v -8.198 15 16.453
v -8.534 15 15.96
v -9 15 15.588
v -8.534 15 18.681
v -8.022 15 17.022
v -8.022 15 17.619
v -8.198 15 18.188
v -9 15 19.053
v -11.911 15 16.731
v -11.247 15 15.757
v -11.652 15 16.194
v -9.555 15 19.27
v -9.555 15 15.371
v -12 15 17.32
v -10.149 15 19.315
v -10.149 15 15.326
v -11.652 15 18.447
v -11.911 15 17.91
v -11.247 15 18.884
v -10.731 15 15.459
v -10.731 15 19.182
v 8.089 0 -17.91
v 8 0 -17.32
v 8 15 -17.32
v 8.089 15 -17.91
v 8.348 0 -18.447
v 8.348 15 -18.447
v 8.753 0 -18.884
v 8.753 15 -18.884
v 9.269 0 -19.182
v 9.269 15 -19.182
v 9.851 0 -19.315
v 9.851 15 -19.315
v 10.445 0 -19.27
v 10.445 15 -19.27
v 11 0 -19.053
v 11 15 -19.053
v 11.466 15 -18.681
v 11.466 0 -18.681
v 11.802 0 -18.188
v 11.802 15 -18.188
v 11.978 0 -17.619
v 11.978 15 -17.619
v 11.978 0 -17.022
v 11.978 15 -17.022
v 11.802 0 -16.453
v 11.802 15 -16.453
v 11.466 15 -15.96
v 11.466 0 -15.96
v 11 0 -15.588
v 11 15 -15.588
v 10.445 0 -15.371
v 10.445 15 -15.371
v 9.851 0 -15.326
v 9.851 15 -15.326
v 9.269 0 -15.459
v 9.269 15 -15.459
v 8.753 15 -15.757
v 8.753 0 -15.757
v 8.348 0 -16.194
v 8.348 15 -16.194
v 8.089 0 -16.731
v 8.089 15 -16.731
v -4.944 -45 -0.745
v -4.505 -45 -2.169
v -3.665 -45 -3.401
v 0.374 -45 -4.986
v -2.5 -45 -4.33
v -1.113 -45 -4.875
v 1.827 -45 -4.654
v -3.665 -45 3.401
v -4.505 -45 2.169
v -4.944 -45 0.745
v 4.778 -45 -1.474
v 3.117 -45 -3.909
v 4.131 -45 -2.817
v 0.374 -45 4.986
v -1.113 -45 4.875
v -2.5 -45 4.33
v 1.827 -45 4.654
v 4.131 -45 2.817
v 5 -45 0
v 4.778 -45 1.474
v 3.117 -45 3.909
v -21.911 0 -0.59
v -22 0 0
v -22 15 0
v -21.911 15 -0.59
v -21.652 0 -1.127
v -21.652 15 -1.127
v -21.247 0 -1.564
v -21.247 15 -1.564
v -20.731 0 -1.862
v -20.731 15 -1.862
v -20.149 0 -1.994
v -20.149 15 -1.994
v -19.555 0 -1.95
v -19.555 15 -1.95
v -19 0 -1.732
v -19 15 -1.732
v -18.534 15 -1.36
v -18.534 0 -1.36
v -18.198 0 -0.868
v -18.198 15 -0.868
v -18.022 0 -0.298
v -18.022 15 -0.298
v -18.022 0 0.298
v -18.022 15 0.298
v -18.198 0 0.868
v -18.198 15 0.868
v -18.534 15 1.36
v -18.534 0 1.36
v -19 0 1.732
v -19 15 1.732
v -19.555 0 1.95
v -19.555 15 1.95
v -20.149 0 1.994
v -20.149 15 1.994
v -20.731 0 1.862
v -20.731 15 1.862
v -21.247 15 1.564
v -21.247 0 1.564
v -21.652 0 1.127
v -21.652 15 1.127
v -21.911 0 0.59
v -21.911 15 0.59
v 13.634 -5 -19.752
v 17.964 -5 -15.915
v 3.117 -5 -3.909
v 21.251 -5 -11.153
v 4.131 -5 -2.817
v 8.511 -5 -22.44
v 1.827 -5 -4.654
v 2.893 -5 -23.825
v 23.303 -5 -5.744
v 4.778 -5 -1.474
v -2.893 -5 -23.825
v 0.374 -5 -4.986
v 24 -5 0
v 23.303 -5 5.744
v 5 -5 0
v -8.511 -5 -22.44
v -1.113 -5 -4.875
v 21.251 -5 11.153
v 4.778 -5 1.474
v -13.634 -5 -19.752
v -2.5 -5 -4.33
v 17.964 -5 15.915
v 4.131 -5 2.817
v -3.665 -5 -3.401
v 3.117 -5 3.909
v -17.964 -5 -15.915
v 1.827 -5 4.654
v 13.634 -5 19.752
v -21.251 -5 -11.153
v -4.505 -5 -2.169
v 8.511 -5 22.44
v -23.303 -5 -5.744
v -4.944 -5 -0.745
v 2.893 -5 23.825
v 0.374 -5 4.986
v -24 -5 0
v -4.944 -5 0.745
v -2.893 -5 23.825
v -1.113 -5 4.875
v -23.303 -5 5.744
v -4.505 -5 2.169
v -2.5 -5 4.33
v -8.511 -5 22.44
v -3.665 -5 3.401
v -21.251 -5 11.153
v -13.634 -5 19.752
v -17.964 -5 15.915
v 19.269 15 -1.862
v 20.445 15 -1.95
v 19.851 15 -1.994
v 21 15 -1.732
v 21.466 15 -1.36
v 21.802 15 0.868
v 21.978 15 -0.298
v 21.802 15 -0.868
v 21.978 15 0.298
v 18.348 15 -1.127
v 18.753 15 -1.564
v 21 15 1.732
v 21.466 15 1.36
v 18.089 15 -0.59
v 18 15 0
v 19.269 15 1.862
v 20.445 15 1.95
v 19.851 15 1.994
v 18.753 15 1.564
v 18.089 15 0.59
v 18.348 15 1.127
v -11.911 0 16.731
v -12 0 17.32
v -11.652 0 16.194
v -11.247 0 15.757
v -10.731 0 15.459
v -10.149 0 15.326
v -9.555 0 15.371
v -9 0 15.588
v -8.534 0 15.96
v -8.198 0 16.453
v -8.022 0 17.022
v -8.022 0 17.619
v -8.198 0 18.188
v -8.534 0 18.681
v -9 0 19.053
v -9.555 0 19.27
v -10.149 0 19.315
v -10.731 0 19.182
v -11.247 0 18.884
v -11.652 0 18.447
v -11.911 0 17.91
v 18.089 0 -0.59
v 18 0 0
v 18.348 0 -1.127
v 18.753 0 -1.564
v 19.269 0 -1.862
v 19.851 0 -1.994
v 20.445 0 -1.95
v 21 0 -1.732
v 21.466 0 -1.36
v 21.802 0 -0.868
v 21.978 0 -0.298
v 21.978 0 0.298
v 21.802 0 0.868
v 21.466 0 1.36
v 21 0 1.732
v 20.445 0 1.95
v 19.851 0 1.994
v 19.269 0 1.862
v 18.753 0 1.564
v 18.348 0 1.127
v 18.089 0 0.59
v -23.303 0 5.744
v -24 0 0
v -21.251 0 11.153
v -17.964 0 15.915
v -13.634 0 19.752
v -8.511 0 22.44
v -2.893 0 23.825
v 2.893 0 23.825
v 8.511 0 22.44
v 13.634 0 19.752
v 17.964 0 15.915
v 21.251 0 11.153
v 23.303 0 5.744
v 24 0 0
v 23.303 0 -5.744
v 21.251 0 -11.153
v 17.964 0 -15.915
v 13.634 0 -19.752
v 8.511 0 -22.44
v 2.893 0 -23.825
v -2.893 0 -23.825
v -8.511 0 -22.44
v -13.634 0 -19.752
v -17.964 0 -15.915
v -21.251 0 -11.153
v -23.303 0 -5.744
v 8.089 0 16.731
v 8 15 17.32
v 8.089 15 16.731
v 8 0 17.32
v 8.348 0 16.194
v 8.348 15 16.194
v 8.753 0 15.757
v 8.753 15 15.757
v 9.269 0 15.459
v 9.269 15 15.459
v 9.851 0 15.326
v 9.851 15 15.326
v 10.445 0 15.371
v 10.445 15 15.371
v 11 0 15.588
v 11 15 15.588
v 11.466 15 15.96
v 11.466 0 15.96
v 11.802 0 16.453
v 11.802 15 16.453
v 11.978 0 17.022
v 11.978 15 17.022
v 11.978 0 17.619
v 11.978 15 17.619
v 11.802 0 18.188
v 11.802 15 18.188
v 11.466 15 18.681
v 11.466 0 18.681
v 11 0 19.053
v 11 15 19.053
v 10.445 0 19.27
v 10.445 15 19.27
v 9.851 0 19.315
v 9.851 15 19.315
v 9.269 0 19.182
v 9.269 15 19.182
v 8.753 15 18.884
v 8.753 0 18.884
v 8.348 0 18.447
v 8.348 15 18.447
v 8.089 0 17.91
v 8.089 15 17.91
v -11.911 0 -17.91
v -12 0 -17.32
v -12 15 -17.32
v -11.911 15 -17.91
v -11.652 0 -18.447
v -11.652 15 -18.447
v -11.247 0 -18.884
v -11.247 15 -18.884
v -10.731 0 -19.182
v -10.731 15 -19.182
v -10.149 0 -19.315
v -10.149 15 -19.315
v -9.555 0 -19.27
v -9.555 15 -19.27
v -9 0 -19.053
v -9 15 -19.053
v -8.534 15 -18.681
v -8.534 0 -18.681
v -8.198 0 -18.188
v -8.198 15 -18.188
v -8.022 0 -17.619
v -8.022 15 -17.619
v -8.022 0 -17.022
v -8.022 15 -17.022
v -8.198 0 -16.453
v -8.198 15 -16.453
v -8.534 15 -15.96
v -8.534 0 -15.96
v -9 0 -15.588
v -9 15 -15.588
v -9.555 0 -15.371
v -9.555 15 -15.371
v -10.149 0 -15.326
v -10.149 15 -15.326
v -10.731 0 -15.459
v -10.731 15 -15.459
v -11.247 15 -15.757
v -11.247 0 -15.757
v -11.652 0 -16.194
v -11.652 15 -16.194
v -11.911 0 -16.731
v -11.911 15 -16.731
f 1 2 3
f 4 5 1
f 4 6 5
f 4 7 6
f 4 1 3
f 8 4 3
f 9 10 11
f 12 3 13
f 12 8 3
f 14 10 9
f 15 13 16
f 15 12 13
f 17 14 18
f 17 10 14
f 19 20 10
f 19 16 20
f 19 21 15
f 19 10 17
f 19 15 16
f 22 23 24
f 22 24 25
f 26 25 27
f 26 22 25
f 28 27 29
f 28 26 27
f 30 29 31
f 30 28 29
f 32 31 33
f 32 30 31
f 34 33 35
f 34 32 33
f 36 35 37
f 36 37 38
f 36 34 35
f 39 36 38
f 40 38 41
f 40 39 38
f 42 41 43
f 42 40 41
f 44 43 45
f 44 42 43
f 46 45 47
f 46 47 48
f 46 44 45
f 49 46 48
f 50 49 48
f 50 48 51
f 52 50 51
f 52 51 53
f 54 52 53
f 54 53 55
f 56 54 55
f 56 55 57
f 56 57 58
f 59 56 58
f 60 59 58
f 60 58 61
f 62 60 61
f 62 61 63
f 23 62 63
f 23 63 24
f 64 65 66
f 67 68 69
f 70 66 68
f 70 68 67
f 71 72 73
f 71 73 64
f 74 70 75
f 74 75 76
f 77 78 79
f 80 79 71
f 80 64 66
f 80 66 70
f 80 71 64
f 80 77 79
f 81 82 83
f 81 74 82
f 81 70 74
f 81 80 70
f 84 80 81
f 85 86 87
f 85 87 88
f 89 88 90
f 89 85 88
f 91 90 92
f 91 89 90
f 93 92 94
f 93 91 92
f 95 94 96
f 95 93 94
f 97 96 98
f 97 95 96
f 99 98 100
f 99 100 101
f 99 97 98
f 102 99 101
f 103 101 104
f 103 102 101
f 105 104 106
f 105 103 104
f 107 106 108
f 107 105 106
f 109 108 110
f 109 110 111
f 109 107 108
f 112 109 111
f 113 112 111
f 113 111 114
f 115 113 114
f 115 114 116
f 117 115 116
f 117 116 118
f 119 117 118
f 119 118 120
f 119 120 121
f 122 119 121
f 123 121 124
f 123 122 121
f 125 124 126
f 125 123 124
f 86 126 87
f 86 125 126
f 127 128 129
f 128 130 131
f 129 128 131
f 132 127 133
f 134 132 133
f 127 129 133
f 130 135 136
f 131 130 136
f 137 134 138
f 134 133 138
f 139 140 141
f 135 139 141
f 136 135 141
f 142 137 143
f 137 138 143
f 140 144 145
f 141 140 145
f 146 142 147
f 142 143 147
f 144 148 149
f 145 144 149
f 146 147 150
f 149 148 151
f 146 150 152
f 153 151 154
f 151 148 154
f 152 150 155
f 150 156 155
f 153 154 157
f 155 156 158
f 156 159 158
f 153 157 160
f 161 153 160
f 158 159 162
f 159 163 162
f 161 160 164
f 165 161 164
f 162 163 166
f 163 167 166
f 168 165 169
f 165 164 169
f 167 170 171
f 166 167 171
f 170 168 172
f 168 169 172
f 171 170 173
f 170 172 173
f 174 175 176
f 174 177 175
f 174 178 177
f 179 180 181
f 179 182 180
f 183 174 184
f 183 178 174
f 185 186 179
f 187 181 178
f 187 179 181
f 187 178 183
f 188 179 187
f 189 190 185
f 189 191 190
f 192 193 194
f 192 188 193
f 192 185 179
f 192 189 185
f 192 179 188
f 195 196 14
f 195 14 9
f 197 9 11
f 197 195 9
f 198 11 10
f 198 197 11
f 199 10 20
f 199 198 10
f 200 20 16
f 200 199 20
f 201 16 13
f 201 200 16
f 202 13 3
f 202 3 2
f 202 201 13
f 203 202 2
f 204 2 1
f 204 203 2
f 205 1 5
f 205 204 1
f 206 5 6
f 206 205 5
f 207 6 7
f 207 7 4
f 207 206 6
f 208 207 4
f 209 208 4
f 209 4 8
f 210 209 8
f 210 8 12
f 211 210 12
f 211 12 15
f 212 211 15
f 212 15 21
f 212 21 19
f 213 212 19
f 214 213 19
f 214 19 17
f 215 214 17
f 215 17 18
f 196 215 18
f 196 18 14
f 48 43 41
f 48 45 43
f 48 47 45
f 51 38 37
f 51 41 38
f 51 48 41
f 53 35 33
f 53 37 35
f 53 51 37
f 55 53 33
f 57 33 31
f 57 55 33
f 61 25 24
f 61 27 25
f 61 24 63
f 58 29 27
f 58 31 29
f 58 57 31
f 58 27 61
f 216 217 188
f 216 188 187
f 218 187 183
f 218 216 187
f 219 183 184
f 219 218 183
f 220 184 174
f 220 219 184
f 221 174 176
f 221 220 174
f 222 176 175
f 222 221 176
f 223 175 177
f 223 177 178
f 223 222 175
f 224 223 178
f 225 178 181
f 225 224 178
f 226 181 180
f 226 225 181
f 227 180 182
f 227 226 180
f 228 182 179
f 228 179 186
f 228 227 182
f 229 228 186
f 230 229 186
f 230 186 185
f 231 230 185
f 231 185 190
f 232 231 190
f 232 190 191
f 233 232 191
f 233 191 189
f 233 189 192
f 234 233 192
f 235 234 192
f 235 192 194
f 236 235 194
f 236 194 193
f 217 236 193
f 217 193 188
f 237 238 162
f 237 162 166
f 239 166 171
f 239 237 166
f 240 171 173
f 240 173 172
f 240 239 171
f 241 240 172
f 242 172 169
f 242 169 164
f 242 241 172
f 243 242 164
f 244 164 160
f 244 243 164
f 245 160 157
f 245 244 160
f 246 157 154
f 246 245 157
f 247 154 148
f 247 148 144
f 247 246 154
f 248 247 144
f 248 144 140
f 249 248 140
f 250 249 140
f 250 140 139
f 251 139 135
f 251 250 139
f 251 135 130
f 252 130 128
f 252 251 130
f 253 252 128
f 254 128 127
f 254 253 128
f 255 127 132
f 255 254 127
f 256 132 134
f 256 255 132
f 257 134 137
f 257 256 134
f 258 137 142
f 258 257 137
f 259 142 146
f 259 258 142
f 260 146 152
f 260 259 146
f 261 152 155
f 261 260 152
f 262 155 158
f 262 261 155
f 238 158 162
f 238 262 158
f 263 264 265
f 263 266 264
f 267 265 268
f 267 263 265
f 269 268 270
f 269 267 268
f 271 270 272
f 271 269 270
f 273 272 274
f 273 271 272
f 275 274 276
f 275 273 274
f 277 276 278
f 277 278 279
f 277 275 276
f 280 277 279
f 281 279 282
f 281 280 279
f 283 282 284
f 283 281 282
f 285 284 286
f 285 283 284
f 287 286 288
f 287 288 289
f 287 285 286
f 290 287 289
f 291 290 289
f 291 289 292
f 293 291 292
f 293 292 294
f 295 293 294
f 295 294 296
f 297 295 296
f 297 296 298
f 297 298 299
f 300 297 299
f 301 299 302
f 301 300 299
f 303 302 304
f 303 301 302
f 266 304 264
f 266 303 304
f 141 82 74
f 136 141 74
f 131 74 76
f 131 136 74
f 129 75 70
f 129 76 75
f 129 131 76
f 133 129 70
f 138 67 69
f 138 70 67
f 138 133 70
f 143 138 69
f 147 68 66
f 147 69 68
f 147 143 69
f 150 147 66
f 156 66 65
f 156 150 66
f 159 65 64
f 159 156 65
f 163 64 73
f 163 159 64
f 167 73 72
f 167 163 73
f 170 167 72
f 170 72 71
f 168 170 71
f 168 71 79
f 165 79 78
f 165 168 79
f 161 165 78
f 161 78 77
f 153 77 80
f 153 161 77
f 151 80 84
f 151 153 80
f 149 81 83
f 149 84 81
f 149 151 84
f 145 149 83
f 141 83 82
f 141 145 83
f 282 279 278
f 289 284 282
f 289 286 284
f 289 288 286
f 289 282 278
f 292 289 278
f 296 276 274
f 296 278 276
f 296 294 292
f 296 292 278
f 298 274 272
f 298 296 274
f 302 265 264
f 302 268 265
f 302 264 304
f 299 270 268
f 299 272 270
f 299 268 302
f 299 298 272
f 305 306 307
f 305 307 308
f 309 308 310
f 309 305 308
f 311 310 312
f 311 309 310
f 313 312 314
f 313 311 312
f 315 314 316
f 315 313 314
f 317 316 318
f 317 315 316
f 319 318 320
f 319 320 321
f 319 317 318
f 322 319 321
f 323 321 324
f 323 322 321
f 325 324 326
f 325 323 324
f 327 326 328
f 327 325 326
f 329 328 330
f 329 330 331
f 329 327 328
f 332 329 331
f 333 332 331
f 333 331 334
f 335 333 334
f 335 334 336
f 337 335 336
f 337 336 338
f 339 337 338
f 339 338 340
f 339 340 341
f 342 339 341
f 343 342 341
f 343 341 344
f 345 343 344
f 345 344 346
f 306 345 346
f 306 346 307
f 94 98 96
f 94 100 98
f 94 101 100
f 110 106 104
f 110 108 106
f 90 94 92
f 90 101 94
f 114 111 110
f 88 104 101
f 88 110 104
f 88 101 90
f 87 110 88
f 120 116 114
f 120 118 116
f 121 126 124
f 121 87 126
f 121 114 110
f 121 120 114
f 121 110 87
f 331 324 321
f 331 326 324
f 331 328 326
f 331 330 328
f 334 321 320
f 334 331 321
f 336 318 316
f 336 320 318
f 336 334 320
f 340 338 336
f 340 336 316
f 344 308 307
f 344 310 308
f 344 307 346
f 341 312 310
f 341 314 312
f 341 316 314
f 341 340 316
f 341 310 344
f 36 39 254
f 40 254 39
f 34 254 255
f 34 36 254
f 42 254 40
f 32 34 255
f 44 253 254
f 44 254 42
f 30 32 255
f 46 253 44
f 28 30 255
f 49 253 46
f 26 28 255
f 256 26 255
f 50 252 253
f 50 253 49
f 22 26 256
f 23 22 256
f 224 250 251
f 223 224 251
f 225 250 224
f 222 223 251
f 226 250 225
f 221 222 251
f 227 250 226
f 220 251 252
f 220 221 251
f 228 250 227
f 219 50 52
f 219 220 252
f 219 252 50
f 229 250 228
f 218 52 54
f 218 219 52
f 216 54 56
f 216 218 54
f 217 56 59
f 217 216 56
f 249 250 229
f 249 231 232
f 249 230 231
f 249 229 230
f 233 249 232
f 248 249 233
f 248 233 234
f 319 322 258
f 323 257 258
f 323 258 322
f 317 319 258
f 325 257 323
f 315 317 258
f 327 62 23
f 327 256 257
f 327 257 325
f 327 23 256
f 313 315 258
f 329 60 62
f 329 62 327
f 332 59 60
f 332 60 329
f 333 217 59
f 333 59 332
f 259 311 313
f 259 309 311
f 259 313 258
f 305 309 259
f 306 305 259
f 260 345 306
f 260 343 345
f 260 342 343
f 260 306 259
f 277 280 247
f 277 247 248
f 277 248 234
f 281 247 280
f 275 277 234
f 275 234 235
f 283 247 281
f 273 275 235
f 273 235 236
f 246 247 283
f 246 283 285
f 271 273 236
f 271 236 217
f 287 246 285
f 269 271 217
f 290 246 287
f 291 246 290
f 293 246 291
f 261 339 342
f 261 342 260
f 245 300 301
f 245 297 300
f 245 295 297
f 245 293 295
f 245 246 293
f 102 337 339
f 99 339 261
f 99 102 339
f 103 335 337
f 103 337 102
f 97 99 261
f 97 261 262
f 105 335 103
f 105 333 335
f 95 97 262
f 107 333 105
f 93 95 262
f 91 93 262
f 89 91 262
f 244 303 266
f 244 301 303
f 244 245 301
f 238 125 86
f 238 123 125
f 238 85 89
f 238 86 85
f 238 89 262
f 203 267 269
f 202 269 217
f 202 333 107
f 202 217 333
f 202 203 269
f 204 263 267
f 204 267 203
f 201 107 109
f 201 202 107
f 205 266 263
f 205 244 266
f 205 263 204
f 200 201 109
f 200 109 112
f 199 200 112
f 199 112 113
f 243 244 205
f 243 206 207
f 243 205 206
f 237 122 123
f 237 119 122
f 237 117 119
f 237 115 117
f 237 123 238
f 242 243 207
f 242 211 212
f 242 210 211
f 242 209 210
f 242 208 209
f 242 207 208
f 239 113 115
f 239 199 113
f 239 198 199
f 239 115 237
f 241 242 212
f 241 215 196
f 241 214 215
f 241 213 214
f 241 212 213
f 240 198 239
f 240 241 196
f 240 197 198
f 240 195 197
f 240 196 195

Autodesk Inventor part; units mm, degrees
ref_plane "YZ Plane" through (0, 0, 0) normal (1, 0, 0) x (0, 1, 0)
ref_plane "XZ Plane" through (0, 0, 0) normal (0, 1, 0) x (-1, 0, 0)
ref_plane "XY Plane" through (0, 0, 0) normal (0, 0, 1) x (1, 0, 0)
sketch "Sketch1" plane through (0, 0, 0) normal (0, 1, 0) x (-1, 0, 0)
  circle A0 centre (0, 0) radius 20
  circle A1 centre (20, 0) radius 2
  circle A2 centre (10, 17.3205) radius 2
  circle A3 centre (-10, 17.3205) radius 2
  circle A4 centre (-20, 0) radius 2
  circle A5 centre (-10, -17.3205) radius 2
  circle A6 centre (10, -17.3205) radius 2
  circle A7 centre (0, 0) radius 24
  dimension "d16" = 40
  dimension "d17" = 4
  dimension "d20" = 360
  dimension "d22" = 48
extrude "Extrusion1" add sketch "Sketch1" against normal blind 5 contours A0 A1 | A0 A1 | A1 A0 A6 A5 A4 A3 A2 | A2 A0 | A0 A2 | A6 A0 | A0 A6 | A3 A0 | A0 A3 | A5 A0 | A0 A5 | A4 A0 | A0 A4 | A7
sketch "Sketch2" plane through (0, -5, 0) normal (0, -1, 0) x (1, 0, 0)
  circle A0 centre (0, 0) radius 5
  dimension "d13" = 10
extrude "Extrusion3" add sketch "Sketch2" along normal blind 40
extrude "Extrusion4" add sketch "Sketch1" along normal blind 15 contours A0 A1 | A0 A1 | A2 A0 | A0 A2 | A6 A0 | A0 A6 | A3 A0 | A0 A3 | A5 A0 | A0 A5 | A4 A0 | A0 A4
properties part number "Output_shaft"
